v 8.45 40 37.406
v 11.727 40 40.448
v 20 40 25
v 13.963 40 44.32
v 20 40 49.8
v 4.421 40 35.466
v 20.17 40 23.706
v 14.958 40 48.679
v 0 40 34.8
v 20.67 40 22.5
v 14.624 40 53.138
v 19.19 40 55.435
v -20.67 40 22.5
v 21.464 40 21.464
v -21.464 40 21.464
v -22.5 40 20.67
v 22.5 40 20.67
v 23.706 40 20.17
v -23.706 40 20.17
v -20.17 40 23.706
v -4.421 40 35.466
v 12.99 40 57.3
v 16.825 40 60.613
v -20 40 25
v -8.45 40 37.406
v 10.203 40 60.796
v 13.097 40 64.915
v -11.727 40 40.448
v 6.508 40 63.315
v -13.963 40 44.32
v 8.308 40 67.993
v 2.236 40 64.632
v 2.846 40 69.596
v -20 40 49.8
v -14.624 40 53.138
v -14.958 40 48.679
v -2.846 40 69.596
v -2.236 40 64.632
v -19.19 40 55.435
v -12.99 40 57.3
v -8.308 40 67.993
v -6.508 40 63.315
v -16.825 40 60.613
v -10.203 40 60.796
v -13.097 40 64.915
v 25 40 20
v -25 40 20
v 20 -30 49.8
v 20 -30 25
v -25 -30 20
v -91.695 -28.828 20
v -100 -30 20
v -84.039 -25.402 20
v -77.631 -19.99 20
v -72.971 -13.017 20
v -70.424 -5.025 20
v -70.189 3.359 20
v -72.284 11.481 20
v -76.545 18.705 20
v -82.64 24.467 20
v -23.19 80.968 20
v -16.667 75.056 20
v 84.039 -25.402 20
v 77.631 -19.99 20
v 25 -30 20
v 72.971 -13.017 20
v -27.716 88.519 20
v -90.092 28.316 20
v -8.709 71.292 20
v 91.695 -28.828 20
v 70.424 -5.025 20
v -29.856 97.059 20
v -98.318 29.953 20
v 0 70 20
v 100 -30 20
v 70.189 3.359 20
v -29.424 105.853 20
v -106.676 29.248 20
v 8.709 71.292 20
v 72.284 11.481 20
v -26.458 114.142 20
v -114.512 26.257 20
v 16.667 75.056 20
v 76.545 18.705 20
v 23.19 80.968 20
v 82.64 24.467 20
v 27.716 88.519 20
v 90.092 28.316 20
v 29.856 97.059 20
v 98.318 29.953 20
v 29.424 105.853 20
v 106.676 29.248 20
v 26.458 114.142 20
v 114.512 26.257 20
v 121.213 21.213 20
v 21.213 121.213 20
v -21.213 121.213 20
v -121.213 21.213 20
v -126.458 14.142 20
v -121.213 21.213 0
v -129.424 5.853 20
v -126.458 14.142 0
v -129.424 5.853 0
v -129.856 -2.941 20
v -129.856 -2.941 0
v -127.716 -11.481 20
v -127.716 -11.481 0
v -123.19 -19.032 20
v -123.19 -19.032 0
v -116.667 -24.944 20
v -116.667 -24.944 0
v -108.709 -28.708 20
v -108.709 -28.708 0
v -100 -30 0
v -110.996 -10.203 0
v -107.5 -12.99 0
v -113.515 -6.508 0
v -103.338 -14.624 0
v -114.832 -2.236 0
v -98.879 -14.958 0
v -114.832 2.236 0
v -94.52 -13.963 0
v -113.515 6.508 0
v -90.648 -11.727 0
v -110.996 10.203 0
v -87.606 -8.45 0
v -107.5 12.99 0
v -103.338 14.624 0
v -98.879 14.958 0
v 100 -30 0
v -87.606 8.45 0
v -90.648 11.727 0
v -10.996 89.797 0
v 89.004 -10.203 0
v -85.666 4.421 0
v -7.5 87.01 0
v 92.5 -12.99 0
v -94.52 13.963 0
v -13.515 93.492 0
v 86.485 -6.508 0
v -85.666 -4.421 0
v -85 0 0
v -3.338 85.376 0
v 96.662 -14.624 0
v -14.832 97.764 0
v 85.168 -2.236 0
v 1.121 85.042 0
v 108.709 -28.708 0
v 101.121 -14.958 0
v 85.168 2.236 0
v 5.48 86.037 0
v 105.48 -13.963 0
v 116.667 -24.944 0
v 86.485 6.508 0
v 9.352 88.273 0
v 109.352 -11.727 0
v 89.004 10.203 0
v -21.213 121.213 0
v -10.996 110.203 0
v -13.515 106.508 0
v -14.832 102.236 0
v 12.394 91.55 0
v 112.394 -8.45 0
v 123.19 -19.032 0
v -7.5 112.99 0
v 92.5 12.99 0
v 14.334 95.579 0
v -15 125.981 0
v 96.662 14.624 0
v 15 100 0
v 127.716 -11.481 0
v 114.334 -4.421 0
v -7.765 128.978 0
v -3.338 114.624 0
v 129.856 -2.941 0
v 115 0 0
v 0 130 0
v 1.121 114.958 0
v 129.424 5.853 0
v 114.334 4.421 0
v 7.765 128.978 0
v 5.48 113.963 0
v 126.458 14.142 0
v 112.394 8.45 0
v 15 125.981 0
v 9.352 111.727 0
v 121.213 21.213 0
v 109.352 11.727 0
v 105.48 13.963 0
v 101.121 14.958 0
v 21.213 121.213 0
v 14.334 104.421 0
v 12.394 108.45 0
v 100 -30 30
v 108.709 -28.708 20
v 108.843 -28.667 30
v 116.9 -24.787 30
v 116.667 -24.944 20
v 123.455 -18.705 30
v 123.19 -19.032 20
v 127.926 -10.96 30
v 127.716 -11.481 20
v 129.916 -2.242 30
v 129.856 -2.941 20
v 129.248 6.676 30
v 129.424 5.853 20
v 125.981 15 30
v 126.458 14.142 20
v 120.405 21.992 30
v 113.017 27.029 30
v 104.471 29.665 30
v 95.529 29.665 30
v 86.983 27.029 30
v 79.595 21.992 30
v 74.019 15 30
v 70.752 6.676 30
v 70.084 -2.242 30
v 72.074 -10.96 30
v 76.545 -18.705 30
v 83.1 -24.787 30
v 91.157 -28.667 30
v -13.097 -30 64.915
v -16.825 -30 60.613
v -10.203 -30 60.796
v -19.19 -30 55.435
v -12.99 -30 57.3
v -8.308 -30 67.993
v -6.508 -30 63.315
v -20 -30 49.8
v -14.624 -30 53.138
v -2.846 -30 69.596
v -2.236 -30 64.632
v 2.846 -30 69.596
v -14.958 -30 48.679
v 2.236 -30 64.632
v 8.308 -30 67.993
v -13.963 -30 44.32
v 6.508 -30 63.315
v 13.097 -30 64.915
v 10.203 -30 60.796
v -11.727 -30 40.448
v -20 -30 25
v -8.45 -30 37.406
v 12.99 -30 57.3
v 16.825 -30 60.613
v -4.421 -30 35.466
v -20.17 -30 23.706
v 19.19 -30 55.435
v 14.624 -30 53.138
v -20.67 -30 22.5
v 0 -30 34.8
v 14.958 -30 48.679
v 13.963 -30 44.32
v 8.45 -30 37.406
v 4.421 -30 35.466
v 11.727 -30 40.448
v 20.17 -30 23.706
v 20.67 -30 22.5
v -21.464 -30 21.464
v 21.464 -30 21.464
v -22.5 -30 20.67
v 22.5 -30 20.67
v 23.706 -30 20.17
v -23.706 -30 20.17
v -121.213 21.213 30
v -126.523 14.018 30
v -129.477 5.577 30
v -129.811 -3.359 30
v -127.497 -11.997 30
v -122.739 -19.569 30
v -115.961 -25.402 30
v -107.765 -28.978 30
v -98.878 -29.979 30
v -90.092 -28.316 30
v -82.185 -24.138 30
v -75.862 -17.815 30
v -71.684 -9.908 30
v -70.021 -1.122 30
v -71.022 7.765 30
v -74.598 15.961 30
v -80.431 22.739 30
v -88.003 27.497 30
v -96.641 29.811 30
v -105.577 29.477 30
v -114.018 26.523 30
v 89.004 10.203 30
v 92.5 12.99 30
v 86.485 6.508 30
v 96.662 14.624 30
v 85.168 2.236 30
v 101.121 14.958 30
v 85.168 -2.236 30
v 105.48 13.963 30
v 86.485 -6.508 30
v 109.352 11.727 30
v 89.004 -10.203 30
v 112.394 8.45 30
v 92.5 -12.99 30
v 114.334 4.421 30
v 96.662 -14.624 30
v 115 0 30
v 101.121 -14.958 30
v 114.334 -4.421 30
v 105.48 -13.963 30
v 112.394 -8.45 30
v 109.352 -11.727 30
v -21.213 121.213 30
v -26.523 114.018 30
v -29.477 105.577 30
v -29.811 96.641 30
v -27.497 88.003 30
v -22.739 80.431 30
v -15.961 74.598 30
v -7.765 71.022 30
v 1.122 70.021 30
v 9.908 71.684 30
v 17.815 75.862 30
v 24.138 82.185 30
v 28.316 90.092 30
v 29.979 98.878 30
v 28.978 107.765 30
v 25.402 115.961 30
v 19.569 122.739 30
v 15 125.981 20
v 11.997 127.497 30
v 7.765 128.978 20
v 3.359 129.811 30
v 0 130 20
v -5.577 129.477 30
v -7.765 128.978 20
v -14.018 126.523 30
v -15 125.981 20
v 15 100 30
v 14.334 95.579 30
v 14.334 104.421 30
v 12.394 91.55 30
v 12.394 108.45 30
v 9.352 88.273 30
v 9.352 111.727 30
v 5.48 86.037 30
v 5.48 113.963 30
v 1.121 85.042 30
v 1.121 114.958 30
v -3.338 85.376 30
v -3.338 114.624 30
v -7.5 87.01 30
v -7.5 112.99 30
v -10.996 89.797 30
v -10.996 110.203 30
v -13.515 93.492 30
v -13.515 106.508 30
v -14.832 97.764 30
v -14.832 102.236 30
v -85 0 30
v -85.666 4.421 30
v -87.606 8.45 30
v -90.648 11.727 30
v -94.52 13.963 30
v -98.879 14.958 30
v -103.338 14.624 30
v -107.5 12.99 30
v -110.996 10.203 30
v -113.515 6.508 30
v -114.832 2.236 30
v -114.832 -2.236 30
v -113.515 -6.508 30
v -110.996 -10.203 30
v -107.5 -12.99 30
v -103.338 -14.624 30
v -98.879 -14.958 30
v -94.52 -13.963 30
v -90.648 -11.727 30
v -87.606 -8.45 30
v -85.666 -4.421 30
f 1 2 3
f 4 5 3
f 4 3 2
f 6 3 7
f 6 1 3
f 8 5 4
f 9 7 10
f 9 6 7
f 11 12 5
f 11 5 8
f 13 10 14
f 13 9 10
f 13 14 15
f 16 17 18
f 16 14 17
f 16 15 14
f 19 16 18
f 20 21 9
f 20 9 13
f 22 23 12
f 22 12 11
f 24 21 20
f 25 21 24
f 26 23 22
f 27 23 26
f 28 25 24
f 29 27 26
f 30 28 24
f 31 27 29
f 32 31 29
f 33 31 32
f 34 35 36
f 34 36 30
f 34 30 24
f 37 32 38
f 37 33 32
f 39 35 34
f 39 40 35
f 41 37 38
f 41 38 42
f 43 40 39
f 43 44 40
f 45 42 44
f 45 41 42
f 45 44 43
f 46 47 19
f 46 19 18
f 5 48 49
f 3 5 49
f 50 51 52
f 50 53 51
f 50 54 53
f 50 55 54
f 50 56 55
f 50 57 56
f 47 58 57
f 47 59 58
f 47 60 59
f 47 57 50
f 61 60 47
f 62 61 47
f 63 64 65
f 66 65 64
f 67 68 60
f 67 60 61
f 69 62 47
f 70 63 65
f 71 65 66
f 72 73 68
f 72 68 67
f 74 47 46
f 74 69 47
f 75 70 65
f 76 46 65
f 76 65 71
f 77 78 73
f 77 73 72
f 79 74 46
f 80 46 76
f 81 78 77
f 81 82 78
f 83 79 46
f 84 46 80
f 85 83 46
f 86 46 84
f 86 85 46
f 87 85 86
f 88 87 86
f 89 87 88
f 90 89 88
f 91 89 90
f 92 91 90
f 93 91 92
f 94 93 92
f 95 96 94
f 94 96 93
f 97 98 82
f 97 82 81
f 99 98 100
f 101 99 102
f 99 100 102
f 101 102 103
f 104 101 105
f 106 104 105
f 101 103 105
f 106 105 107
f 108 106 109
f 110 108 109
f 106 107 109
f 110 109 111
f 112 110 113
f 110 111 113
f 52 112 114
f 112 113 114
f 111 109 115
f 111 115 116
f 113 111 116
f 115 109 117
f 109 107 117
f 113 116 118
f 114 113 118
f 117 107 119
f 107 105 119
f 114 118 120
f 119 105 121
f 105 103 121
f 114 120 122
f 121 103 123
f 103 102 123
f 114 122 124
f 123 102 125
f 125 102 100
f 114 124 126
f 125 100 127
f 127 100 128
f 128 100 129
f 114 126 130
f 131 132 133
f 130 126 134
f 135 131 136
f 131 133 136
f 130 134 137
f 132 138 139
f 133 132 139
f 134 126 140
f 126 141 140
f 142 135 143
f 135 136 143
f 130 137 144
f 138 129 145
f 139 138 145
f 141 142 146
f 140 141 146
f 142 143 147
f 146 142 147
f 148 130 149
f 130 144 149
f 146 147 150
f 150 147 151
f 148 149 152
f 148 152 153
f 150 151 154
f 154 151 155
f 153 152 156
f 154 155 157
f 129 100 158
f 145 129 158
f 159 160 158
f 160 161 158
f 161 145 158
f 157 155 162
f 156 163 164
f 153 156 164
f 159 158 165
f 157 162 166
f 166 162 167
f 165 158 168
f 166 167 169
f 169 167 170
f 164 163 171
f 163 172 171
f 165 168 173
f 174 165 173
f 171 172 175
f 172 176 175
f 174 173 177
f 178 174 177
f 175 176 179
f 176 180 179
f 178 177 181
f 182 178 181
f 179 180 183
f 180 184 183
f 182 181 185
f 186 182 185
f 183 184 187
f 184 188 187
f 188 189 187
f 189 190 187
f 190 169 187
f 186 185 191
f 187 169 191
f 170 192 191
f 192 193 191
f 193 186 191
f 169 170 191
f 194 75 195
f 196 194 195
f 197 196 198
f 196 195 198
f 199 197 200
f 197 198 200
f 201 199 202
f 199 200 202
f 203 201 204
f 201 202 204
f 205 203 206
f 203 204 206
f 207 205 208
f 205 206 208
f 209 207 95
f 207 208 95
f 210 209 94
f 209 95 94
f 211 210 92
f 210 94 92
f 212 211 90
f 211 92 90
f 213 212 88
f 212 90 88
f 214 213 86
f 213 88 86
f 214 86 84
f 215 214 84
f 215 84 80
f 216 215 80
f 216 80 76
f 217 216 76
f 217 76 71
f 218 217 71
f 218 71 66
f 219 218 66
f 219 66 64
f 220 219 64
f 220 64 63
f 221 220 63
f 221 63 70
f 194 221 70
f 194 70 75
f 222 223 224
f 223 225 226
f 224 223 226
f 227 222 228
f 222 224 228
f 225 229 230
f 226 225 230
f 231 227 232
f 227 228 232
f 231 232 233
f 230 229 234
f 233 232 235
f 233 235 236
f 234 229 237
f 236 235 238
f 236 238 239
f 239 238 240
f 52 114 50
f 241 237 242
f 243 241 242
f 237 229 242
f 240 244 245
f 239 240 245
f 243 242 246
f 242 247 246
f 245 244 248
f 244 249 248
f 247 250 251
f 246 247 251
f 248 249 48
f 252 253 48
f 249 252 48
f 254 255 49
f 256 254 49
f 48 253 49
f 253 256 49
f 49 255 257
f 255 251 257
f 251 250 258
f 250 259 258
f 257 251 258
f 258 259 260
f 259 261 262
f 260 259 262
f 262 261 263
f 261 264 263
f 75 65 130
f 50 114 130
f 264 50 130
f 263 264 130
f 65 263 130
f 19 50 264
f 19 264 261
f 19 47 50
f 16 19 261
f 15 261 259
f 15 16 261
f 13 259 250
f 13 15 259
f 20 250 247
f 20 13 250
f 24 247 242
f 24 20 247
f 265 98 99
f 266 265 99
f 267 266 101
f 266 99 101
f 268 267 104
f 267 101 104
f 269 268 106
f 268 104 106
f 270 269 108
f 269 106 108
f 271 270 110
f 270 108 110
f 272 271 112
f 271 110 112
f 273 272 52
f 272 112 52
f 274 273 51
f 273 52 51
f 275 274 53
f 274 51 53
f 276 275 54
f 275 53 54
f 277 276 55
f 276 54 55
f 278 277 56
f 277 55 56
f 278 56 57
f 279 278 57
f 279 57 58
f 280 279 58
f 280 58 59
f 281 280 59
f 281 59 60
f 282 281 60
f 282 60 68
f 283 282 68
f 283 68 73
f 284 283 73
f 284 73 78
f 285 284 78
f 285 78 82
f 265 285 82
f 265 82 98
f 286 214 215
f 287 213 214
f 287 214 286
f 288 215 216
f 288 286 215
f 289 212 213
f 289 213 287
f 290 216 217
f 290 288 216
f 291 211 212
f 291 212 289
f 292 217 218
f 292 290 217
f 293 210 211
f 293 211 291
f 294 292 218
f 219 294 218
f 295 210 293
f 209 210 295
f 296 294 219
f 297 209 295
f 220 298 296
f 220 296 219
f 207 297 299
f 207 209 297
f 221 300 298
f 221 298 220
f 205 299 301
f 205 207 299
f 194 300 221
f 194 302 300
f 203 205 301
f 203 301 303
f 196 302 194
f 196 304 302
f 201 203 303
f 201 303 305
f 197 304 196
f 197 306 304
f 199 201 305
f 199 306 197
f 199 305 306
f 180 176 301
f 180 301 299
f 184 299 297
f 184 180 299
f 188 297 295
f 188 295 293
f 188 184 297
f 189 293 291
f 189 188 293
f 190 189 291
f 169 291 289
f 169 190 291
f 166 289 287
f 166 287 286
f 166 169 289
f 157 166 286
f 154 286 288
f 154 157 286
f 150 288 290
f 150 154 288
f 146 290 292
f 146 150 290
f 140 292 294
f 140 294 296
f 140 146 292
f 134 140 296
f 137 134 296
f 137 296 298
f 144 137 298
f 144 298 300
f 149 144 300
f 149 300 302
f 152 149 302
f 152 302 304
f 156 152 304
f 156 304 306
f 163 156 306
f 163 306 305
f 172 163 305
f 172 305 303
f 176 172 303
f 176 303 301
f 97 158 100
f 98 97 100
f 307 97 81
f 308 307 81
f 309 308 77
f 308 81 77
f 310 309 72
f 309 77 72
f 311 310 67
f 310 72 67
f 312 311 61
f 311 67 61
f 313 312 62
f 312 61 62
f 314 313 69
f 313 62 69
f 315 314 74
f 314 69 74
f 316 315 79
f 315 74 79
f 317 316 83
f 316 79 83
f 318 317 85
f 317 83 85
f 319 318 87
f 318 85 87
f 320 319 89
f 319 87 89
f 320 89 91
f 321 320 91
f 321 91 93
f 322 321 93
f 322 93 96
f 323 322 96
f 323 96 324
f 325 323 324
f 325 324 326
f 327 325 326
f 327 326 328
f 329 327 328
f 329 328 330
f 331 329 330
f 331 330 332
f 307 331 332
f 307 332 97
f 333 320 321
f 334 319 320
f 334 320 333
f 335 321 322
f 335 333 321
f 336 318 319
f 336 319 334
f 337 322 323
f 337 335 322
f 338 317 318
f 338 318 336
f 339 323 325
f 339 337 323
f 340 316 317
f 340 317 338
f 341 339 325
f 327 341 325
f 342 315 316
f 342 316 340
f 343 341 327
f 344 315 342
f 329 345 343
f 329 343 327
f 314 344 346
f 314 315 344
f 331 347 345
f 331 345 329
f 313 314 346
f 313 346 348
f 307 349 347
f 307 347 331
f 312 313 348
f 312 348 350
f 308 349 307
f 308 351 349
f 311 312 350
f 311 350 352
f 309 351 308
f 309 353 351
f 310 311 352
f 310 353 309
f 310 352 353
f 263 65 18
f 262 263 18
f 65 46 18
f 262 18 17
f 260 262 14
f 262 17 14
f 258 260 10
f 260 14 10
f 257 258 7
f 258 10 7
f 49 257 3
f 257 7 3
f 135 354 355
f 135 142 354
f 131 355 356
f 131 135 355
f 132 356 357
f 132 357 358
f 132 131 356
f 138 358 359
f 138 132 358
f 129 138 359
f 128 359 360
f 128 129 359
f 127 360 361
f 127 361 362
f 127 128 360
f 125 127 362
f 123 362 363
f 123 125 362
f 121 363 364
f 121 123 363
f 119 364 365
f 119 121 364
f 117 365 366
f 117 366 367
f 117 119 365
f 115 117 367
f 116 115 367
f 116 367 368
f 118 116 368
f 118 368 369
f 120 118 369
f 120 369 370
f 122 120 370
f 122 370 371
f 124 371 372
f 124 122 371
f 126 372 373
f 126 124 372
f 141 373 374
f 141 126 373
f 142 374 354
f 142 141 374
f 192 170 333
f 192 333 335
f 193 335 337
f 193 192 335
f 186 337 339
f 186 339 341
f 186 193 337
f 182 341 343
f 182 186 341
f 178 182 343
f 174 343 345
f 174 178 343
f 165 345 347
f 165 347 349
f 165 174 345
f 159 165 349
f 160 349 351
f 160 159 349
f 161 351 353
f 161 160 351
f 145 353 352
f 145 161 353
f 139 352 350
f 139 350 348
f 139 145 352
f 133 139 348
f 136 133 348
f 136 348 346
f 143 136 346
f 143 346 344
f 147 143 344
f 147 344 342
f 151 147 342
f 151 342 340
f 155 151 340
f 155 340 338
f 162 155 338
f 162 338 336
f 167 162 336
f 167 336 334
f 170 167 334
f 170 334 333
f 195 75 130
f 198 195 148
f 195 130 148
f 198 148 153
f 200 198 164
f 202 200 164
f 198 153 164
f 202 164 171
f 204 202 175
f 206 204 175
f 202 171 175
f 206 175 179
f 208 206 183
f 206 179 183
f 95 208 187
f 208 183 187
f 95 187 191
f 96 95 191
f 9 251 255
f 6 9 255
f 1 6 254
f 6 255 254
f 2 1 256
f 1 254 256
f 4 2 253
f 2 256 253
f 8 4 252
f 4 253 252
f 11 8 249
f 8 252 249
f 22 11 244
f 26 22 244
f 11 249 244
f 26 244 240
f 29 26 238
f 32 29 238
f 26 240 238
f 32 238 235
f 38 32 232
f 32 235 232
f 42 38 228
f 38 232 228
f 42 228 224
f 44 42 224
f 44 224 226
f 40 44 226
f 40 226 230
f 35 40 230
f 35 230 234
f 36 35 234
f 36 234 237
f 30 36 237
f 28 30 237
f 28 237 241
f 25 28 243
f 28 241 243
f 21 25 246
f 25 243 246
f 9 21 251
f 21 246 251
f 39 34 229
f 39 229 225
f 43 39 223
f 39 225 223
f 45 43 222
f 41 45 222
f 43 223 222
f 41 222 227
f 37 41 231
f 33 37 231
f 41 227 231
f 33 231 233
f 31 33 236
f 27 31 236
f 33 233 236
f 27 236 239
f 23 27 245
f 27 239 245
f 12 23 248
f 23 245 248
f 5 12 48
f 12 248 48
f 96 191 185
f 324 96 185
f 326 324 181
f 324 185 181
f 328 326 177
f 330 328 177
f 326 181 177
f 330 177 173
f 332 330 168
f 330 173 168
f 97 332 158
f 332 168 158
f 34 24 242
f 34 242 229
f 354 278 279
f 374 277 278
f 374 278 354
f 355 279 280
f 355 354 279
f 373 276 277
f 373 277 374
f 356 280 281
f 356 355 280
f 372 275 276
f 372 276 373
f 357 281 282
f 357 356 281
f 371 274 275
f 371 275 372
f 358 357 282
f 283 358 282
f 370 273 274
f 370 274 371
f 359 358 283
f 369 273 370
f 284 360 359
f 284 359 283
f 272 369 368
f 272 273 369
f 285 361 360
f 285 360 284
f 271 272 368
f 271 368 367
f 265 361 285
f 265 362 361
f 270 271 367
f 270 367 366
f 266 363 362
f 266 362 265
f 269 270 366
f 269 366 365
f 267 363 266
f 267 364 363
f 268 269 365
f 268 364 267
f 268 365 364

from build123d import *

# Parameters (mm, degrees)
SKETCH2_R           = 15
BOSS_EXTRUDE2_DEPTH = 20
SKETCH3_R           = 30
SKETCH3_R_2         = 15
BOSS_EXTRUDE3_DEPTH = 10
SKETCH4_R           = 15
BOSS_EXTRUDE4_DEPTH = 70
FILLET1_R           = 5
FILLET2_R           = 5


with BuildPart() as part:
    # Sketch2 → Boss-Extrude2 (new body)
    with BuildSketch(Plane.XY):
        with BuildLine():
            Line((-100, -30), (100, -30))
            ThreePointArc((100, -30), (127.716385975, -11.480502971), (121.213203436, 21.213203436))
            Line((121.213203436, 21.213203436), (21.213203436, 121.213203436))
            ThreePointArc((21.213203436, 121.213203436), (0, 130), (-21.213203436, 121.213203436))
            Line((-21.213203436, 121.213203436), (-121.213203436, 21.213203436))
            ThreePointArc((-121.213203436, 21.213203436), (-127.716385975, -11.480502971), (-100, -30))
        make_face()
        with Locations((100, 0)):
            Circle(SKETCH2_R, mode=Mode.SUBTRACT)
        with Locations((-100, 0)):
            Circle(SKETCH2_R, mode=Mode.SUBTRACT)
        with Locations((0, 100)):
            Circle(SKETCH2_R, mode=Mode.SUBTRACT)
    extrude(amount=BOSS_EXTRUDE2_DEPTH)

    # Sketch3 → Boss-Extrude3 (add)
    # profile 1 of 3: a face of its own
    with BuildSketch(Plane.XY.offset(20)):
        with Locations(Location((-100, 0, 0), (0, 0, 135))):
            Circle(SKETCH3_R)
        with Locations((-100, 0)):
            Circle(SKETCH3_R_2, mode=Mode.SUBTRACT)
    # profile 2 of 3: a face of its own
    with BuildSketch(Plane.XY.offset(20)):
        with Locations(Location((100, 0, 0), (0, 0, 270))):
            Circle(SKETCH3_R)
        with Locations((100, 0)):
            Circle(SKETCH3_R_2, mode=Mode.SUBTRACT)
    # profile 3 of 3: a face of its own
    with BuildSketch(Plane.XY.offset(20)):
        with Locations(Location((0, 100, 0), (0, 0, 135))):
            Circle(SKETCH3_R)
        with Locations((0, 100)):
            Circle(SKETCH3_R_2, mode=Mode.SUBTRACT)
    extrude(amount=BOSS_EXTRUDE3_DEPTH)

    # Sketch4 → Boss-Extrude4 (add)
    with BuildSketch(Plane.XZ.offset(30)):
        with BuildLine():
            Line((20, 49.8), (20, 20))
            Line((20, 20), (-20, 20))
            Line((-20, 20), (-20, 49.8))
            ThreePointArc((-20, 49.8), (0, 69.8), (20, 49.8))
        make_face()
        with Locations(Location((0, 49.8, 0), (0, 0, 270))):
            Circle(SKETCH4_R, mode=Mode.SUBTRACT)
    extrude(amount=-BOSS_EXTRUDE4_DEPTH)

    # Fillet1
    fillet1_edges = [part.edges().sort_by_distance(p)[0] for p in [
        (20, 5, 20),
    ]]
    fillet(fillet1_edges, radius=FILLET1_R)

    # Fillet2
    fillet2_edges = [part.edges().sort_by_distance(p)[0] for p in [
        (-20, 5, 20),
    ]]
    fillet(fillet2_edges, radius=FILLET2_R)


solid = part.part
